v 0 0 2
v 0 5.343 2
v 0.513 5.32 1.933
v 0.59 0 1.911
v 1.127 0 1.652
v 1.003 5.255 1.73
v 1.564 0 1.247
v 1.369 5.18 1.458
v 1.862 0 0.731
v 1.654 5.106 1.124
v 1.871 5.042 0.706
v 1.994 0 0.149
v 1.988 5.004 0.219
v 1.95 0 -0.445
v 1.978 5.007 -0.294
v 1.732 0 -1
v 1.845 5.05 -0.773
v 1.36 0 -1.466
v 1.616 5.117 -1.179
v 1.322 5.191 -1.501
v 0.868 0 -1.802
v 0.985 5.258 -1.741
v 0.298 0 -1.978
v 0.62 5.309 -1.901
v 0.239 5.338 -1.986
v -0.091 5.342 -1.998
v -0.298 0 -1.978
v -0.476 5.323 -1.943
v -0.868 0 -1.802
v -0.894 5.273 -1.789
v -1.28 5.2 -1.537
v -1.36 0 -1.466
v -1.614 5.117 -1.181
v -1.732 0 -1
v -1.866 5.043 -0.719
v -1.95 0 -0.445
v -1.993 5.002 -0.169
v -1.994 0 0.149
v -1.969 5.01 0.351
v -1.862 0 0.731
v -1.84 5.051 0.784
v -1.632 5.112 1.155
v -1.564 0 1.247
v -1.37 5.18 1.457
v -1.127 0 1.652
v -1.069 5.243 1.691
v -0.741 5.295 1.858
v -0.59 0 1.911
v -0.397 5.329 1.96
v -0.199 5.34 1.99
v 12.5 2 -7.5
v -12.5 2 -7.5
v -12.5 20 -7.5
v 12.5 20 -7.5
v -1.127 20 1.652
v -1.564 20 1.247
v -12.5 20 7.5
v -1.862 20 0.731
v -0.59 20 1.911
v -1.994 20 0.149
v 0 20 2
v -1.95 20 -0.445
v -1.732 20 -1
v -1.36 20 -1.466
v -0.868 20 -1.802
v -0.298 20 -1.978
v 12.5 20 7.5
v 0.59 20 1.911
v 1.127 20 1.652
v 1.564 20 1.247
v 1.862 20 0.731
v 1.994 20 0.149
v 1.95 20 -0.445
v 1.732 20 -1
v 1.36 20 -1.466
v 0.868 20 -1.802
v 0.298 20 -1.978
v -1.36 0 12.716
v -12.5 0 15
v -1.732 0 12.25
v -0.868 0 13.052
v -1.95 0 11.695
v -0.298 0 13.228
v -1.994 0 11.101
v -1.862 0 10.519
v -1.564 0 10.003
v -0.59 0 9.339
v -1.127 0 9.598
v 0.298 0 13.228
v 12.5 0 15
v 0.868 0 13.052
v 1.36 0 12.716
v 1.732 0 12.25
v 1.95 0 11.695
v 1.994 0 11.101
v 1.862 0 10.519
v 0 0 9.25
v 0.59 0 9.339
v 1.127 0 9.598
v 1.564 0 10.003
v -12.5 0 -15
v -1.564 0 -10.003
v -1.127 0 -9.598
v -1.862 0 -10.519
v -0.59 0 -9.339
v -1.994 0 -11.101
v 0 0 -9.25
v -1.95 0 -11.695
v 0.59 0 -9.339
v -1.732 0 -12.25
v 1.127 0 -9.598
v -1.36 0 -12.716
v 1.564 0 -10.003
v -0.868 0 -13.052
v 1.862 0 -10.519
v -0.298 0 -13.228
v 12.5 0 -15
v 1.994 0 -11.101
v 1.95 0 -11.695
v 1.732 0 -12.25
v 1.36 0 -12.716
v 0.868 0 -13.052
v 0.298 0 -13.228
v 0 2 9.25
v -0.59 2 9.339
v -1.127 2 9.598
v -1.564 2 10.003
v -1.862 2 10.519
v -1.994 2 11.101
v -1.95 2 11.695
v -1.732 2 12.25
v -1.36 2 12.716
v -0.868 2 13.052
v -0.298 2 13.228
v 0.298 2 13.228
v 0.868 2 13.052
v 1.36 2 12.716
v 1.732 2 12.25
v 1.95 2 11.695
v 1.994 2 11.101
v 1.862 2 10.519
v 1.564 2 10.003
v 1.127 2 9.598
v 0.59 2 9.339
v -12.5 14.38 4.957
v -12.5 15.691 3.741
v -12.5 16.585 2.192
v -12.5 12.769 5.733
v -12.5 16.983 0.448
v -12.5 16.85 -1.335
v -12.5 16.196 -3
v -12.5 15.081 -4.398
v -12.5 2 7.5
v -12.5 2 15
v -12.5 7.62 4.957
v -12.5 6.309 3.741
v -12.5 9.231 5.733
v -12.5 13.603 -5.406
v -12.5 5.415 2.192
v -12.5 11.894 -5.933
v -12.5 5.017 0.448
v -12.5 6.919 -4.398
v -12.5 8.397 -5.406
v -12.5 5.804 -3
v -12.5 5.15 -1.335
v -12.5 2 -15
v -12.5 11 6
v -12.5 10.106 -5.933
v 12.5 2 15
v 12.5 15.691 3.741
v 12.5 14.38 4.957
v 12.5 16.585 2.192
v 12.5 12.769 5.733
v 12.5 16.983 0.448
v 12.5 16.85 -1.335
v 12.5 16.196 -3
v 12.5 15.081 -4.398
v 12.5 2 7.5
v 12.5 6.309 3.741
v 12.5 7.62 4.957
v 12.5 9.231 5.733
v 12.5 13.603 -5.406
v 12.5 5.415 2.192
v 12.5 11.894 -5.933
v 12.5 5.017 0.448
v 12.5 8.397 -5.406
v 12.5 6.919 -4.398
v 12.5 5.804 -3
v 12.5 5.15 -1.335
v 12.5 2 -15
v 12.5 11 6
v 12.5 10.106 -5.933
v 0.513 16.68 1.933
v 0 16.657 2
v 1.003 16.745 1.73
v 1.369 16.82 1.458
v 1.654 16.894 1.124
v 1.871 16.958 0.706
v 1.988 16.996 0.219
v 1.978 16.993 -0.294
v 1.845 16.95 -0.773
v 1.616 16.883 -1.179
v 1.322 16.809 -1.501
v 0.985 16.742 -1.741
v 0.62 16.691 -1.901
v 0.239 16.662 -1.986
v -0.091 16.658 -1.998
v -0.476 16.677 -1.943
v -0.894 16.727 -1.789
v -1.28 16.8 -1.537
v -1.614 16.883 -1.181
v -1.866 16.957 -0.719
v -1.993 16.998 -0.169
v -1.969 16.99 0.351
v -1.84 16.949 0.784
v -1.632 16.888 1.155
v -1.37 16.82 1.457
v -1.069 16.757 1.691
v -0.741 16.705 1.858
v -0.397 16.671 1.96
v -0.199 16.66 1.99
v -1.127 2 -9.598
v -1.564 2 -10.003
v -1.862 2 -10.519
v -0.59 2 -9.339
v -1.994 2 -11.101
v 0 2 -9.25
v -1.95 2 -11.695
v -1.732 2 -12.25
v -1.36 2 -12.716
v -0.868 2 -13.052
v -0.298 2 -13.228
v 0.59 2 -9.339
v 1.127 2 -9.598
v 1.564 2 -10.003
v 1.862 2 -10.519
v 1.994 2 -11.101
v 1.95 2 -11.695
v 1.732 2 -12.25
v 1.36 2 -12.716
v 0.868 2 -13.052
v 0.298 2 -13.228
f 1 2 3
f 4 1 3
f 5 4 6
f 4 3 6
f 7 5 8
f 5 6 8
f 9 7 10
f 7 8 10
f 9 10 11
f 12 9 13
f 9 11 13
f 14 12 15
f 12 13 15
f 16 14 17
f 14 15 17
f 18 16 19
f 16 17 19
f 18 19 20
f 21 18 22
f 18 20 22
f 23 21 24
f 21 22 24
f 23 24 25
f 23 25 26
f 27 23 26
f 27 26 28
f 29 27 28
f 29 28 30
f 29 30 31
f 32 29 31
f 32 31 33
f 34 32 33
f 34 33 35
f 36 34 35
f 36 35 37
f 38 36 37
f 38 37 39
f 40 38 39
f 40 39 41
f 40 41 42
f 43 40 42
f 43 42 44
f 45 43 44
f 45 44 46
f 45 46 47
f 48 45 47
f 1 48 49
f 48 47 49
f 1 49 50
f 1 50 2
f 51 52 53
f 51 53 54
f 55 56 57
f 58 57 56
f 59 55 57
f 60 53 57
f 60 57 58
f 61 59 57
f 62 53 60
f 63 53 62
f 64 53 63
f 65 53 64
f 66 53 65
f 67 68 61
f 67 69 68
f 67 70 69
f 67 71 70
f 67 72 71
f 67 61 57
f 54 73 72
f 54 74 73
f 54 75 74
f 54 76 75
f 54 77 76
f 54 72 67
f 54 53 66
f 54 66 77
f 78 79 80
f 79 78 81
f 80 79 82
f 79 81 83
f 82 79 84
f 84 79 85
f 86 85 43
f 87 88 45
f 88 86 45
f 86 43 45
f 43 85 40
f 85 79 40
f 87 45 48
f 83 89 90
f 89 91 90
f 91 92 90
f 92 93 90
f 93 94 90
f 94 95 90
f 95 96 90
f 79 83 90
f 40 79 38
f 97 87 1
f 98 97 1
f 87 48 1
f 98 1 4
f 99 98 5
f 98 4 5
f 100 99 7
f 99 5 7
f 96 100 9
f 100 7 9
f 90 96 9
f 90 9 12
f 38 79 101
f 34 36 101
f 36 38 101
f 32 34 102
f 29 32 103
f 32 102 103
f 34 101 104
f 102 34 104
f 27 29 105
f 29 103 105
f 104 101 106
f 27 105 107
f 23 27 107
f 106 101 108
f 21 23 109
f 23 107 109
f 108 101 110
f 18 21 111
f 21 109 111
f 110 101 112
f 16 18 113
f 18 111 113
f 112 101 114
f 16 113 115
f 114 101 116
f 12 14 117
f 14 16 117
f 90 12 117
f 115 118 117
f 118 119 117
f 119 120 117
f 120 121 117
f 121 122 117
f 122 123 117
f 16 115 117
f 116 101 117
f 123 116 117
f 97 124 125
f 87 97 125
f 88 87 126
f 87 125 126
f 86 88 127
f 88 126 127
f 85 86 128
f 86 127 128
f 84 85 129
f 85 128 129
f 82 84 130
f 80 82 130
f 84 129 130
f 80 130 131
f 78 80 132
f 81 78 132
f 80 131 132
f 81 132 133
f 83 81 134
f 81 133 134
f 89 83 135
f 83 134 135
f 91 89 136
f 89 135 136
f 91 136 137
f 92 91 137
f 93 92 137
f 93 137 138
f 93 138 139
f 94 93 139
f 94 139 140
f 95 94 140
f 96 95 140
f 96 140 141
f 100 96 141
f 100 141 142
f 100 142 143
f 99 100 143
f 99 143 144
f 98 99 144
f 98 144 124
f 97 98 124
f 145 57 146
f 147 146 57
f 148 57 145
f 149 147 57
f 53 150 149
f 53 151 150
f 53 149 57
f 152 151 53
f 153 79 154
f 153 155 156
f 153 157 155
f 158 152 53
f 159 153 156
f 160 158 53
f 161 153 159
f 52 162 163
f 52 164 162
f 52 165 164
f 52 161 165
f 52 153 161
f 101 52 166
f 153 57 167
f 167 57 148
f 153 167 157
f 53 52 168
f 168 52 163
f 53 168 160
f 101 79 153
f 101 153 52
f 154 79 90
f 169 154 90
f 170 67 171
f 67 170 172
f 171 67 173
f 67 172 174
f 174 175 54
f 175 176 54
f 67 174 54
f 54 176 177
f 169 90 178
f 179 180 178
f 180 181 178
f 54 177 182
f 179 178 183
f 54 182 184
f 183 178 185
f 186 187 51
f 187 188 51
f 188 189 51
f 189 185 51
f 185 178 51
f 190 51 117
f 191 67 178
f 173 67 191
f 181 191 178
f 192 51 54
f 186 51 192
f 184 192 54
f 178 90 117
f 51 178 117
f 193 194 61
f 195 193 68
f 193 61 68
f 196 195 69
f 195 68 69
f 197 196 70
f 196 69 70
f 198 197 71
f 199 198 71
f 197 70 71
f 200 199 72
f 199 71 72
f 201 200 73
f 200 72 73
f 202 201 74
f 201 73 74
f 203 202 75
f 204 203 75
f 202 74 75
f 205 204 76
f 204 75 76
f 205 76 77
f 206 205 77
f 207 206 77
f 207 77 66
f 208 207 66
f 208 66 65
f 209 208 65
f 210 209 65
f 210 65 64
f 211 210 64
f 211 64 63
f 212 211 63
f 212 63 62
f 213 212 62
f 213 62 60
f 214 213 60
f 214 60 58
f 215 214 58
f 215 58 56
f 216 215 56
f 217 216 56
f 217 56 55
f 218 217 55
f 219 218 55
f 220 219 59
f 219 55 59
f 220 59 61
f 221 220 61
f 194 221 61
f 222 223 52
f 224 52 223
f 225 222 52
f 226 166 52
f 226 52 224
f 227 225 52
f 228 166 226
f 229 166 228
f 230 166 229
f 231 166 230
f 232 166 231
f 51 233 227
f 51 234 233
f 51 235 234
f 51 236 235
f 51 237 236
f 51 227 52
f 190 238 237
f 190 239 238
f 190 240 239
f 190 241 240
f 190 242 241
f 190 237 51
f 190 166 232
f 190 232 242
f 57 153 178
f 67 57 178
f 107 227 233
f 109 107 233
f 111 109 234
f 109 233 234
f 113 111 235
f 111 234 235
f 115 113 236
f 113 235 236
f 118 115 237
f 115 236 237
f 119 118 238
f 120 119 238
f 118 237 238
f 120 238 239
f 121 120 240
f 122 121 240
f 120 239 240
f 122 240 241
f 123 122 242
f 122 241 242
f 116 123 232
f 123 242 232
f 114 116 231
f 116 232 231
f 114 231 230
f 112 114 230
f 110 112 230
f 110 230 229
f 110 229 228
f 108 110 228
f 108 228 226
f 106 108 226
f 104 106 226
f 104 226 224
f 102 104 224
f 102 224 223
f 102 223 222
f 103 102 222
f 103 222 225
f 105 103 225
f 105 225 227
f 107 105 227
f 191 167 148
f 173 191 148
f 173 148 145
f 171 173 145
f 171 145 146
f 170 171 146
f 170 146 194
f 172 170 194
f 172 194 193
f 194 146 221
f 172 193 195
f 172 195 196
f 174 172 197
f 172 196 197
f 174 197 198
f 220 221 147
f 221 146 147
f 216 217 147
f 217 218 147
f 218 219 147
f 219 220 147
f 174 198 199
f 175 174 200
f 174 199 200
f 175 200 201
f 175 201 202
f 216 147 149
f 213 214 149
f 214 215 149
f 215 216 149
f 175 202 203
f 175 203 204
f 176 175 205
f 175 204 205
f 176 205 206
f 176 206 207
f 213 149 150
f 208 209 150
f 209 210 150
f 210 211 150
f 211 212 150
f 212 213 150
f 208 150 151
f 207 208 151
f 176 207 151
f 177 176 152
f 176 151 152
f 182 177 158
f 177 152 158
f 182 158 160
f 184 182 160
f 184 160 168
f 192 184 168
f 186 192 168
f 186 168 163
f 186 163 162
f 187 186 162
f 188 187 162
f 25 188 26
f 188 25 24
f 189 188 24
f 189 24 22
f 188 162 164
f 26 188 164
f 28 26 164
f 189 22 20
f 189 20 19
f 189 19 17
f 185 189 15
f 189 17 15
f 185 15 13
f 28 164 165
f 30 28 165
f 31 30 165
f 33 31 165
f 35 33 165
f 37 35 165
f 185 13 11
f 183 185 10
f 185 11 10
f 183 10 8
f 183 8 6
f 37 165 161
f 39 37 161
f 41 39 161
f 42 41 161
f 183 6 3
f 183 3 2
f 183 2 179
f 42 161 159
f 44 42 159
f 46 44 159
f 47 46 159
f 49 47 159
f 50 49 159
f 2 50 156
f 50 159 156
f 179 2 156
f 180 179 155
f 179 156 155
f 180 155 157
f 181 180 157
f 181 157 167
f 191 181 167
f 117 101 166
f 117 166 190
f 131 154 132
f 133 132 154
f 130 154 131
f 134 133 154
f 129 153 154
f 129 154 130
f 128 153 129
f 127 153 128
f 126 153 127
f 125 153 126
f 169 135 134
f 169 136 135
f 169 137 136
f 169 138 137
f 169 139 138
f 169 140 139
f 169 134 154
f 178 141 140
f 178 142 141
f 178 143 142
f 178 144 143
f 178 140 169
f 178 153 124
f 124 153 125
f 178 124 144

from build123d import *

# Parameters (mm, degrees)
SKETCH1_W           = 25
SKETCH1_H           = 30
BOSS_EXTRUDE1_DEPTH = 2
SKETCH2_W           = 25
SKETCH2_H           = 15
BOSS_EXTRUDE2_DEPTH = 18
SKETCH3_R           = 6
CUT_EXTRUDE1_DEPTH  = 36.355339059
SKETCH4_R           = 2
CUT_EXTRUDE2_DEPTH  = 28.950849719
SKETCH5_R           = 2
CUT_EXTRUDE3_DEPTH  = 27.556543565


with BuildPart() as part:
    # Sketch1 → Boss-Extrude1 (new body)
    with BuildSketch(Plane(origin=(0, 0, 0), x_dir=(1, 0, 0), z_dir=(0, 1, 0))):
        Rectangle(SKETCH1_W, SKETCH1_H)
    extrude(amount=BOSS_EXTRUDE1_DEPTH)

    # Sketch2 → Boss-Extrude2 (add)
    with BuildSketch(Plane(origin=(0, 2, 0), x_dir=(1, 0, 0), z_dir=(0, 1, 0))):
        Rectangle(SKETCH2_W, SKETCH2_H)
    extrude(amount=BOSS_EXTRUDE2_DEPTH)

    # Sketch3 → Cut-Extrude1 (cut, through all)
    with BuildSketch(Plane.ZY.offset(12.5)):
        with Locations((0, 11)):
            Circle(SKETCH3_R)
    extrude(amount=-CUT_EXTRUDE1_DEPTH, mode=Mode.SUBTRACT)

    # Sketch4 → Cut-Extrude2 (cut, through all)
    with BuildSketch(Plane(origin=(0, 20, 0), x_dir=(1, 0, 0), z_dir=(0, 1, 0))):
        Circle(SKETCH4_R)
    extrude(amount=-CUT_EXTRUDE2_DEPTH, mode=Mode.SUBTRACT)

    # Sketch5 → Cut-Extrude3 (cut, through all)
    with BuildSketch(Plane(origin=(0, 2, 0), x_dir=(1, 0, 0), z_dir=(0, 1, 0))):
        with Locations((0, 11.25)):
            Circle(SKETCH5_R)
        with Locations((0, -11.25)):
            Circle(SKETCH5_R)
    extrude(amount=-CUT_EXTRUDE3_DEPTH, mode=Mode.SUBTRACT)


solid = part.part
